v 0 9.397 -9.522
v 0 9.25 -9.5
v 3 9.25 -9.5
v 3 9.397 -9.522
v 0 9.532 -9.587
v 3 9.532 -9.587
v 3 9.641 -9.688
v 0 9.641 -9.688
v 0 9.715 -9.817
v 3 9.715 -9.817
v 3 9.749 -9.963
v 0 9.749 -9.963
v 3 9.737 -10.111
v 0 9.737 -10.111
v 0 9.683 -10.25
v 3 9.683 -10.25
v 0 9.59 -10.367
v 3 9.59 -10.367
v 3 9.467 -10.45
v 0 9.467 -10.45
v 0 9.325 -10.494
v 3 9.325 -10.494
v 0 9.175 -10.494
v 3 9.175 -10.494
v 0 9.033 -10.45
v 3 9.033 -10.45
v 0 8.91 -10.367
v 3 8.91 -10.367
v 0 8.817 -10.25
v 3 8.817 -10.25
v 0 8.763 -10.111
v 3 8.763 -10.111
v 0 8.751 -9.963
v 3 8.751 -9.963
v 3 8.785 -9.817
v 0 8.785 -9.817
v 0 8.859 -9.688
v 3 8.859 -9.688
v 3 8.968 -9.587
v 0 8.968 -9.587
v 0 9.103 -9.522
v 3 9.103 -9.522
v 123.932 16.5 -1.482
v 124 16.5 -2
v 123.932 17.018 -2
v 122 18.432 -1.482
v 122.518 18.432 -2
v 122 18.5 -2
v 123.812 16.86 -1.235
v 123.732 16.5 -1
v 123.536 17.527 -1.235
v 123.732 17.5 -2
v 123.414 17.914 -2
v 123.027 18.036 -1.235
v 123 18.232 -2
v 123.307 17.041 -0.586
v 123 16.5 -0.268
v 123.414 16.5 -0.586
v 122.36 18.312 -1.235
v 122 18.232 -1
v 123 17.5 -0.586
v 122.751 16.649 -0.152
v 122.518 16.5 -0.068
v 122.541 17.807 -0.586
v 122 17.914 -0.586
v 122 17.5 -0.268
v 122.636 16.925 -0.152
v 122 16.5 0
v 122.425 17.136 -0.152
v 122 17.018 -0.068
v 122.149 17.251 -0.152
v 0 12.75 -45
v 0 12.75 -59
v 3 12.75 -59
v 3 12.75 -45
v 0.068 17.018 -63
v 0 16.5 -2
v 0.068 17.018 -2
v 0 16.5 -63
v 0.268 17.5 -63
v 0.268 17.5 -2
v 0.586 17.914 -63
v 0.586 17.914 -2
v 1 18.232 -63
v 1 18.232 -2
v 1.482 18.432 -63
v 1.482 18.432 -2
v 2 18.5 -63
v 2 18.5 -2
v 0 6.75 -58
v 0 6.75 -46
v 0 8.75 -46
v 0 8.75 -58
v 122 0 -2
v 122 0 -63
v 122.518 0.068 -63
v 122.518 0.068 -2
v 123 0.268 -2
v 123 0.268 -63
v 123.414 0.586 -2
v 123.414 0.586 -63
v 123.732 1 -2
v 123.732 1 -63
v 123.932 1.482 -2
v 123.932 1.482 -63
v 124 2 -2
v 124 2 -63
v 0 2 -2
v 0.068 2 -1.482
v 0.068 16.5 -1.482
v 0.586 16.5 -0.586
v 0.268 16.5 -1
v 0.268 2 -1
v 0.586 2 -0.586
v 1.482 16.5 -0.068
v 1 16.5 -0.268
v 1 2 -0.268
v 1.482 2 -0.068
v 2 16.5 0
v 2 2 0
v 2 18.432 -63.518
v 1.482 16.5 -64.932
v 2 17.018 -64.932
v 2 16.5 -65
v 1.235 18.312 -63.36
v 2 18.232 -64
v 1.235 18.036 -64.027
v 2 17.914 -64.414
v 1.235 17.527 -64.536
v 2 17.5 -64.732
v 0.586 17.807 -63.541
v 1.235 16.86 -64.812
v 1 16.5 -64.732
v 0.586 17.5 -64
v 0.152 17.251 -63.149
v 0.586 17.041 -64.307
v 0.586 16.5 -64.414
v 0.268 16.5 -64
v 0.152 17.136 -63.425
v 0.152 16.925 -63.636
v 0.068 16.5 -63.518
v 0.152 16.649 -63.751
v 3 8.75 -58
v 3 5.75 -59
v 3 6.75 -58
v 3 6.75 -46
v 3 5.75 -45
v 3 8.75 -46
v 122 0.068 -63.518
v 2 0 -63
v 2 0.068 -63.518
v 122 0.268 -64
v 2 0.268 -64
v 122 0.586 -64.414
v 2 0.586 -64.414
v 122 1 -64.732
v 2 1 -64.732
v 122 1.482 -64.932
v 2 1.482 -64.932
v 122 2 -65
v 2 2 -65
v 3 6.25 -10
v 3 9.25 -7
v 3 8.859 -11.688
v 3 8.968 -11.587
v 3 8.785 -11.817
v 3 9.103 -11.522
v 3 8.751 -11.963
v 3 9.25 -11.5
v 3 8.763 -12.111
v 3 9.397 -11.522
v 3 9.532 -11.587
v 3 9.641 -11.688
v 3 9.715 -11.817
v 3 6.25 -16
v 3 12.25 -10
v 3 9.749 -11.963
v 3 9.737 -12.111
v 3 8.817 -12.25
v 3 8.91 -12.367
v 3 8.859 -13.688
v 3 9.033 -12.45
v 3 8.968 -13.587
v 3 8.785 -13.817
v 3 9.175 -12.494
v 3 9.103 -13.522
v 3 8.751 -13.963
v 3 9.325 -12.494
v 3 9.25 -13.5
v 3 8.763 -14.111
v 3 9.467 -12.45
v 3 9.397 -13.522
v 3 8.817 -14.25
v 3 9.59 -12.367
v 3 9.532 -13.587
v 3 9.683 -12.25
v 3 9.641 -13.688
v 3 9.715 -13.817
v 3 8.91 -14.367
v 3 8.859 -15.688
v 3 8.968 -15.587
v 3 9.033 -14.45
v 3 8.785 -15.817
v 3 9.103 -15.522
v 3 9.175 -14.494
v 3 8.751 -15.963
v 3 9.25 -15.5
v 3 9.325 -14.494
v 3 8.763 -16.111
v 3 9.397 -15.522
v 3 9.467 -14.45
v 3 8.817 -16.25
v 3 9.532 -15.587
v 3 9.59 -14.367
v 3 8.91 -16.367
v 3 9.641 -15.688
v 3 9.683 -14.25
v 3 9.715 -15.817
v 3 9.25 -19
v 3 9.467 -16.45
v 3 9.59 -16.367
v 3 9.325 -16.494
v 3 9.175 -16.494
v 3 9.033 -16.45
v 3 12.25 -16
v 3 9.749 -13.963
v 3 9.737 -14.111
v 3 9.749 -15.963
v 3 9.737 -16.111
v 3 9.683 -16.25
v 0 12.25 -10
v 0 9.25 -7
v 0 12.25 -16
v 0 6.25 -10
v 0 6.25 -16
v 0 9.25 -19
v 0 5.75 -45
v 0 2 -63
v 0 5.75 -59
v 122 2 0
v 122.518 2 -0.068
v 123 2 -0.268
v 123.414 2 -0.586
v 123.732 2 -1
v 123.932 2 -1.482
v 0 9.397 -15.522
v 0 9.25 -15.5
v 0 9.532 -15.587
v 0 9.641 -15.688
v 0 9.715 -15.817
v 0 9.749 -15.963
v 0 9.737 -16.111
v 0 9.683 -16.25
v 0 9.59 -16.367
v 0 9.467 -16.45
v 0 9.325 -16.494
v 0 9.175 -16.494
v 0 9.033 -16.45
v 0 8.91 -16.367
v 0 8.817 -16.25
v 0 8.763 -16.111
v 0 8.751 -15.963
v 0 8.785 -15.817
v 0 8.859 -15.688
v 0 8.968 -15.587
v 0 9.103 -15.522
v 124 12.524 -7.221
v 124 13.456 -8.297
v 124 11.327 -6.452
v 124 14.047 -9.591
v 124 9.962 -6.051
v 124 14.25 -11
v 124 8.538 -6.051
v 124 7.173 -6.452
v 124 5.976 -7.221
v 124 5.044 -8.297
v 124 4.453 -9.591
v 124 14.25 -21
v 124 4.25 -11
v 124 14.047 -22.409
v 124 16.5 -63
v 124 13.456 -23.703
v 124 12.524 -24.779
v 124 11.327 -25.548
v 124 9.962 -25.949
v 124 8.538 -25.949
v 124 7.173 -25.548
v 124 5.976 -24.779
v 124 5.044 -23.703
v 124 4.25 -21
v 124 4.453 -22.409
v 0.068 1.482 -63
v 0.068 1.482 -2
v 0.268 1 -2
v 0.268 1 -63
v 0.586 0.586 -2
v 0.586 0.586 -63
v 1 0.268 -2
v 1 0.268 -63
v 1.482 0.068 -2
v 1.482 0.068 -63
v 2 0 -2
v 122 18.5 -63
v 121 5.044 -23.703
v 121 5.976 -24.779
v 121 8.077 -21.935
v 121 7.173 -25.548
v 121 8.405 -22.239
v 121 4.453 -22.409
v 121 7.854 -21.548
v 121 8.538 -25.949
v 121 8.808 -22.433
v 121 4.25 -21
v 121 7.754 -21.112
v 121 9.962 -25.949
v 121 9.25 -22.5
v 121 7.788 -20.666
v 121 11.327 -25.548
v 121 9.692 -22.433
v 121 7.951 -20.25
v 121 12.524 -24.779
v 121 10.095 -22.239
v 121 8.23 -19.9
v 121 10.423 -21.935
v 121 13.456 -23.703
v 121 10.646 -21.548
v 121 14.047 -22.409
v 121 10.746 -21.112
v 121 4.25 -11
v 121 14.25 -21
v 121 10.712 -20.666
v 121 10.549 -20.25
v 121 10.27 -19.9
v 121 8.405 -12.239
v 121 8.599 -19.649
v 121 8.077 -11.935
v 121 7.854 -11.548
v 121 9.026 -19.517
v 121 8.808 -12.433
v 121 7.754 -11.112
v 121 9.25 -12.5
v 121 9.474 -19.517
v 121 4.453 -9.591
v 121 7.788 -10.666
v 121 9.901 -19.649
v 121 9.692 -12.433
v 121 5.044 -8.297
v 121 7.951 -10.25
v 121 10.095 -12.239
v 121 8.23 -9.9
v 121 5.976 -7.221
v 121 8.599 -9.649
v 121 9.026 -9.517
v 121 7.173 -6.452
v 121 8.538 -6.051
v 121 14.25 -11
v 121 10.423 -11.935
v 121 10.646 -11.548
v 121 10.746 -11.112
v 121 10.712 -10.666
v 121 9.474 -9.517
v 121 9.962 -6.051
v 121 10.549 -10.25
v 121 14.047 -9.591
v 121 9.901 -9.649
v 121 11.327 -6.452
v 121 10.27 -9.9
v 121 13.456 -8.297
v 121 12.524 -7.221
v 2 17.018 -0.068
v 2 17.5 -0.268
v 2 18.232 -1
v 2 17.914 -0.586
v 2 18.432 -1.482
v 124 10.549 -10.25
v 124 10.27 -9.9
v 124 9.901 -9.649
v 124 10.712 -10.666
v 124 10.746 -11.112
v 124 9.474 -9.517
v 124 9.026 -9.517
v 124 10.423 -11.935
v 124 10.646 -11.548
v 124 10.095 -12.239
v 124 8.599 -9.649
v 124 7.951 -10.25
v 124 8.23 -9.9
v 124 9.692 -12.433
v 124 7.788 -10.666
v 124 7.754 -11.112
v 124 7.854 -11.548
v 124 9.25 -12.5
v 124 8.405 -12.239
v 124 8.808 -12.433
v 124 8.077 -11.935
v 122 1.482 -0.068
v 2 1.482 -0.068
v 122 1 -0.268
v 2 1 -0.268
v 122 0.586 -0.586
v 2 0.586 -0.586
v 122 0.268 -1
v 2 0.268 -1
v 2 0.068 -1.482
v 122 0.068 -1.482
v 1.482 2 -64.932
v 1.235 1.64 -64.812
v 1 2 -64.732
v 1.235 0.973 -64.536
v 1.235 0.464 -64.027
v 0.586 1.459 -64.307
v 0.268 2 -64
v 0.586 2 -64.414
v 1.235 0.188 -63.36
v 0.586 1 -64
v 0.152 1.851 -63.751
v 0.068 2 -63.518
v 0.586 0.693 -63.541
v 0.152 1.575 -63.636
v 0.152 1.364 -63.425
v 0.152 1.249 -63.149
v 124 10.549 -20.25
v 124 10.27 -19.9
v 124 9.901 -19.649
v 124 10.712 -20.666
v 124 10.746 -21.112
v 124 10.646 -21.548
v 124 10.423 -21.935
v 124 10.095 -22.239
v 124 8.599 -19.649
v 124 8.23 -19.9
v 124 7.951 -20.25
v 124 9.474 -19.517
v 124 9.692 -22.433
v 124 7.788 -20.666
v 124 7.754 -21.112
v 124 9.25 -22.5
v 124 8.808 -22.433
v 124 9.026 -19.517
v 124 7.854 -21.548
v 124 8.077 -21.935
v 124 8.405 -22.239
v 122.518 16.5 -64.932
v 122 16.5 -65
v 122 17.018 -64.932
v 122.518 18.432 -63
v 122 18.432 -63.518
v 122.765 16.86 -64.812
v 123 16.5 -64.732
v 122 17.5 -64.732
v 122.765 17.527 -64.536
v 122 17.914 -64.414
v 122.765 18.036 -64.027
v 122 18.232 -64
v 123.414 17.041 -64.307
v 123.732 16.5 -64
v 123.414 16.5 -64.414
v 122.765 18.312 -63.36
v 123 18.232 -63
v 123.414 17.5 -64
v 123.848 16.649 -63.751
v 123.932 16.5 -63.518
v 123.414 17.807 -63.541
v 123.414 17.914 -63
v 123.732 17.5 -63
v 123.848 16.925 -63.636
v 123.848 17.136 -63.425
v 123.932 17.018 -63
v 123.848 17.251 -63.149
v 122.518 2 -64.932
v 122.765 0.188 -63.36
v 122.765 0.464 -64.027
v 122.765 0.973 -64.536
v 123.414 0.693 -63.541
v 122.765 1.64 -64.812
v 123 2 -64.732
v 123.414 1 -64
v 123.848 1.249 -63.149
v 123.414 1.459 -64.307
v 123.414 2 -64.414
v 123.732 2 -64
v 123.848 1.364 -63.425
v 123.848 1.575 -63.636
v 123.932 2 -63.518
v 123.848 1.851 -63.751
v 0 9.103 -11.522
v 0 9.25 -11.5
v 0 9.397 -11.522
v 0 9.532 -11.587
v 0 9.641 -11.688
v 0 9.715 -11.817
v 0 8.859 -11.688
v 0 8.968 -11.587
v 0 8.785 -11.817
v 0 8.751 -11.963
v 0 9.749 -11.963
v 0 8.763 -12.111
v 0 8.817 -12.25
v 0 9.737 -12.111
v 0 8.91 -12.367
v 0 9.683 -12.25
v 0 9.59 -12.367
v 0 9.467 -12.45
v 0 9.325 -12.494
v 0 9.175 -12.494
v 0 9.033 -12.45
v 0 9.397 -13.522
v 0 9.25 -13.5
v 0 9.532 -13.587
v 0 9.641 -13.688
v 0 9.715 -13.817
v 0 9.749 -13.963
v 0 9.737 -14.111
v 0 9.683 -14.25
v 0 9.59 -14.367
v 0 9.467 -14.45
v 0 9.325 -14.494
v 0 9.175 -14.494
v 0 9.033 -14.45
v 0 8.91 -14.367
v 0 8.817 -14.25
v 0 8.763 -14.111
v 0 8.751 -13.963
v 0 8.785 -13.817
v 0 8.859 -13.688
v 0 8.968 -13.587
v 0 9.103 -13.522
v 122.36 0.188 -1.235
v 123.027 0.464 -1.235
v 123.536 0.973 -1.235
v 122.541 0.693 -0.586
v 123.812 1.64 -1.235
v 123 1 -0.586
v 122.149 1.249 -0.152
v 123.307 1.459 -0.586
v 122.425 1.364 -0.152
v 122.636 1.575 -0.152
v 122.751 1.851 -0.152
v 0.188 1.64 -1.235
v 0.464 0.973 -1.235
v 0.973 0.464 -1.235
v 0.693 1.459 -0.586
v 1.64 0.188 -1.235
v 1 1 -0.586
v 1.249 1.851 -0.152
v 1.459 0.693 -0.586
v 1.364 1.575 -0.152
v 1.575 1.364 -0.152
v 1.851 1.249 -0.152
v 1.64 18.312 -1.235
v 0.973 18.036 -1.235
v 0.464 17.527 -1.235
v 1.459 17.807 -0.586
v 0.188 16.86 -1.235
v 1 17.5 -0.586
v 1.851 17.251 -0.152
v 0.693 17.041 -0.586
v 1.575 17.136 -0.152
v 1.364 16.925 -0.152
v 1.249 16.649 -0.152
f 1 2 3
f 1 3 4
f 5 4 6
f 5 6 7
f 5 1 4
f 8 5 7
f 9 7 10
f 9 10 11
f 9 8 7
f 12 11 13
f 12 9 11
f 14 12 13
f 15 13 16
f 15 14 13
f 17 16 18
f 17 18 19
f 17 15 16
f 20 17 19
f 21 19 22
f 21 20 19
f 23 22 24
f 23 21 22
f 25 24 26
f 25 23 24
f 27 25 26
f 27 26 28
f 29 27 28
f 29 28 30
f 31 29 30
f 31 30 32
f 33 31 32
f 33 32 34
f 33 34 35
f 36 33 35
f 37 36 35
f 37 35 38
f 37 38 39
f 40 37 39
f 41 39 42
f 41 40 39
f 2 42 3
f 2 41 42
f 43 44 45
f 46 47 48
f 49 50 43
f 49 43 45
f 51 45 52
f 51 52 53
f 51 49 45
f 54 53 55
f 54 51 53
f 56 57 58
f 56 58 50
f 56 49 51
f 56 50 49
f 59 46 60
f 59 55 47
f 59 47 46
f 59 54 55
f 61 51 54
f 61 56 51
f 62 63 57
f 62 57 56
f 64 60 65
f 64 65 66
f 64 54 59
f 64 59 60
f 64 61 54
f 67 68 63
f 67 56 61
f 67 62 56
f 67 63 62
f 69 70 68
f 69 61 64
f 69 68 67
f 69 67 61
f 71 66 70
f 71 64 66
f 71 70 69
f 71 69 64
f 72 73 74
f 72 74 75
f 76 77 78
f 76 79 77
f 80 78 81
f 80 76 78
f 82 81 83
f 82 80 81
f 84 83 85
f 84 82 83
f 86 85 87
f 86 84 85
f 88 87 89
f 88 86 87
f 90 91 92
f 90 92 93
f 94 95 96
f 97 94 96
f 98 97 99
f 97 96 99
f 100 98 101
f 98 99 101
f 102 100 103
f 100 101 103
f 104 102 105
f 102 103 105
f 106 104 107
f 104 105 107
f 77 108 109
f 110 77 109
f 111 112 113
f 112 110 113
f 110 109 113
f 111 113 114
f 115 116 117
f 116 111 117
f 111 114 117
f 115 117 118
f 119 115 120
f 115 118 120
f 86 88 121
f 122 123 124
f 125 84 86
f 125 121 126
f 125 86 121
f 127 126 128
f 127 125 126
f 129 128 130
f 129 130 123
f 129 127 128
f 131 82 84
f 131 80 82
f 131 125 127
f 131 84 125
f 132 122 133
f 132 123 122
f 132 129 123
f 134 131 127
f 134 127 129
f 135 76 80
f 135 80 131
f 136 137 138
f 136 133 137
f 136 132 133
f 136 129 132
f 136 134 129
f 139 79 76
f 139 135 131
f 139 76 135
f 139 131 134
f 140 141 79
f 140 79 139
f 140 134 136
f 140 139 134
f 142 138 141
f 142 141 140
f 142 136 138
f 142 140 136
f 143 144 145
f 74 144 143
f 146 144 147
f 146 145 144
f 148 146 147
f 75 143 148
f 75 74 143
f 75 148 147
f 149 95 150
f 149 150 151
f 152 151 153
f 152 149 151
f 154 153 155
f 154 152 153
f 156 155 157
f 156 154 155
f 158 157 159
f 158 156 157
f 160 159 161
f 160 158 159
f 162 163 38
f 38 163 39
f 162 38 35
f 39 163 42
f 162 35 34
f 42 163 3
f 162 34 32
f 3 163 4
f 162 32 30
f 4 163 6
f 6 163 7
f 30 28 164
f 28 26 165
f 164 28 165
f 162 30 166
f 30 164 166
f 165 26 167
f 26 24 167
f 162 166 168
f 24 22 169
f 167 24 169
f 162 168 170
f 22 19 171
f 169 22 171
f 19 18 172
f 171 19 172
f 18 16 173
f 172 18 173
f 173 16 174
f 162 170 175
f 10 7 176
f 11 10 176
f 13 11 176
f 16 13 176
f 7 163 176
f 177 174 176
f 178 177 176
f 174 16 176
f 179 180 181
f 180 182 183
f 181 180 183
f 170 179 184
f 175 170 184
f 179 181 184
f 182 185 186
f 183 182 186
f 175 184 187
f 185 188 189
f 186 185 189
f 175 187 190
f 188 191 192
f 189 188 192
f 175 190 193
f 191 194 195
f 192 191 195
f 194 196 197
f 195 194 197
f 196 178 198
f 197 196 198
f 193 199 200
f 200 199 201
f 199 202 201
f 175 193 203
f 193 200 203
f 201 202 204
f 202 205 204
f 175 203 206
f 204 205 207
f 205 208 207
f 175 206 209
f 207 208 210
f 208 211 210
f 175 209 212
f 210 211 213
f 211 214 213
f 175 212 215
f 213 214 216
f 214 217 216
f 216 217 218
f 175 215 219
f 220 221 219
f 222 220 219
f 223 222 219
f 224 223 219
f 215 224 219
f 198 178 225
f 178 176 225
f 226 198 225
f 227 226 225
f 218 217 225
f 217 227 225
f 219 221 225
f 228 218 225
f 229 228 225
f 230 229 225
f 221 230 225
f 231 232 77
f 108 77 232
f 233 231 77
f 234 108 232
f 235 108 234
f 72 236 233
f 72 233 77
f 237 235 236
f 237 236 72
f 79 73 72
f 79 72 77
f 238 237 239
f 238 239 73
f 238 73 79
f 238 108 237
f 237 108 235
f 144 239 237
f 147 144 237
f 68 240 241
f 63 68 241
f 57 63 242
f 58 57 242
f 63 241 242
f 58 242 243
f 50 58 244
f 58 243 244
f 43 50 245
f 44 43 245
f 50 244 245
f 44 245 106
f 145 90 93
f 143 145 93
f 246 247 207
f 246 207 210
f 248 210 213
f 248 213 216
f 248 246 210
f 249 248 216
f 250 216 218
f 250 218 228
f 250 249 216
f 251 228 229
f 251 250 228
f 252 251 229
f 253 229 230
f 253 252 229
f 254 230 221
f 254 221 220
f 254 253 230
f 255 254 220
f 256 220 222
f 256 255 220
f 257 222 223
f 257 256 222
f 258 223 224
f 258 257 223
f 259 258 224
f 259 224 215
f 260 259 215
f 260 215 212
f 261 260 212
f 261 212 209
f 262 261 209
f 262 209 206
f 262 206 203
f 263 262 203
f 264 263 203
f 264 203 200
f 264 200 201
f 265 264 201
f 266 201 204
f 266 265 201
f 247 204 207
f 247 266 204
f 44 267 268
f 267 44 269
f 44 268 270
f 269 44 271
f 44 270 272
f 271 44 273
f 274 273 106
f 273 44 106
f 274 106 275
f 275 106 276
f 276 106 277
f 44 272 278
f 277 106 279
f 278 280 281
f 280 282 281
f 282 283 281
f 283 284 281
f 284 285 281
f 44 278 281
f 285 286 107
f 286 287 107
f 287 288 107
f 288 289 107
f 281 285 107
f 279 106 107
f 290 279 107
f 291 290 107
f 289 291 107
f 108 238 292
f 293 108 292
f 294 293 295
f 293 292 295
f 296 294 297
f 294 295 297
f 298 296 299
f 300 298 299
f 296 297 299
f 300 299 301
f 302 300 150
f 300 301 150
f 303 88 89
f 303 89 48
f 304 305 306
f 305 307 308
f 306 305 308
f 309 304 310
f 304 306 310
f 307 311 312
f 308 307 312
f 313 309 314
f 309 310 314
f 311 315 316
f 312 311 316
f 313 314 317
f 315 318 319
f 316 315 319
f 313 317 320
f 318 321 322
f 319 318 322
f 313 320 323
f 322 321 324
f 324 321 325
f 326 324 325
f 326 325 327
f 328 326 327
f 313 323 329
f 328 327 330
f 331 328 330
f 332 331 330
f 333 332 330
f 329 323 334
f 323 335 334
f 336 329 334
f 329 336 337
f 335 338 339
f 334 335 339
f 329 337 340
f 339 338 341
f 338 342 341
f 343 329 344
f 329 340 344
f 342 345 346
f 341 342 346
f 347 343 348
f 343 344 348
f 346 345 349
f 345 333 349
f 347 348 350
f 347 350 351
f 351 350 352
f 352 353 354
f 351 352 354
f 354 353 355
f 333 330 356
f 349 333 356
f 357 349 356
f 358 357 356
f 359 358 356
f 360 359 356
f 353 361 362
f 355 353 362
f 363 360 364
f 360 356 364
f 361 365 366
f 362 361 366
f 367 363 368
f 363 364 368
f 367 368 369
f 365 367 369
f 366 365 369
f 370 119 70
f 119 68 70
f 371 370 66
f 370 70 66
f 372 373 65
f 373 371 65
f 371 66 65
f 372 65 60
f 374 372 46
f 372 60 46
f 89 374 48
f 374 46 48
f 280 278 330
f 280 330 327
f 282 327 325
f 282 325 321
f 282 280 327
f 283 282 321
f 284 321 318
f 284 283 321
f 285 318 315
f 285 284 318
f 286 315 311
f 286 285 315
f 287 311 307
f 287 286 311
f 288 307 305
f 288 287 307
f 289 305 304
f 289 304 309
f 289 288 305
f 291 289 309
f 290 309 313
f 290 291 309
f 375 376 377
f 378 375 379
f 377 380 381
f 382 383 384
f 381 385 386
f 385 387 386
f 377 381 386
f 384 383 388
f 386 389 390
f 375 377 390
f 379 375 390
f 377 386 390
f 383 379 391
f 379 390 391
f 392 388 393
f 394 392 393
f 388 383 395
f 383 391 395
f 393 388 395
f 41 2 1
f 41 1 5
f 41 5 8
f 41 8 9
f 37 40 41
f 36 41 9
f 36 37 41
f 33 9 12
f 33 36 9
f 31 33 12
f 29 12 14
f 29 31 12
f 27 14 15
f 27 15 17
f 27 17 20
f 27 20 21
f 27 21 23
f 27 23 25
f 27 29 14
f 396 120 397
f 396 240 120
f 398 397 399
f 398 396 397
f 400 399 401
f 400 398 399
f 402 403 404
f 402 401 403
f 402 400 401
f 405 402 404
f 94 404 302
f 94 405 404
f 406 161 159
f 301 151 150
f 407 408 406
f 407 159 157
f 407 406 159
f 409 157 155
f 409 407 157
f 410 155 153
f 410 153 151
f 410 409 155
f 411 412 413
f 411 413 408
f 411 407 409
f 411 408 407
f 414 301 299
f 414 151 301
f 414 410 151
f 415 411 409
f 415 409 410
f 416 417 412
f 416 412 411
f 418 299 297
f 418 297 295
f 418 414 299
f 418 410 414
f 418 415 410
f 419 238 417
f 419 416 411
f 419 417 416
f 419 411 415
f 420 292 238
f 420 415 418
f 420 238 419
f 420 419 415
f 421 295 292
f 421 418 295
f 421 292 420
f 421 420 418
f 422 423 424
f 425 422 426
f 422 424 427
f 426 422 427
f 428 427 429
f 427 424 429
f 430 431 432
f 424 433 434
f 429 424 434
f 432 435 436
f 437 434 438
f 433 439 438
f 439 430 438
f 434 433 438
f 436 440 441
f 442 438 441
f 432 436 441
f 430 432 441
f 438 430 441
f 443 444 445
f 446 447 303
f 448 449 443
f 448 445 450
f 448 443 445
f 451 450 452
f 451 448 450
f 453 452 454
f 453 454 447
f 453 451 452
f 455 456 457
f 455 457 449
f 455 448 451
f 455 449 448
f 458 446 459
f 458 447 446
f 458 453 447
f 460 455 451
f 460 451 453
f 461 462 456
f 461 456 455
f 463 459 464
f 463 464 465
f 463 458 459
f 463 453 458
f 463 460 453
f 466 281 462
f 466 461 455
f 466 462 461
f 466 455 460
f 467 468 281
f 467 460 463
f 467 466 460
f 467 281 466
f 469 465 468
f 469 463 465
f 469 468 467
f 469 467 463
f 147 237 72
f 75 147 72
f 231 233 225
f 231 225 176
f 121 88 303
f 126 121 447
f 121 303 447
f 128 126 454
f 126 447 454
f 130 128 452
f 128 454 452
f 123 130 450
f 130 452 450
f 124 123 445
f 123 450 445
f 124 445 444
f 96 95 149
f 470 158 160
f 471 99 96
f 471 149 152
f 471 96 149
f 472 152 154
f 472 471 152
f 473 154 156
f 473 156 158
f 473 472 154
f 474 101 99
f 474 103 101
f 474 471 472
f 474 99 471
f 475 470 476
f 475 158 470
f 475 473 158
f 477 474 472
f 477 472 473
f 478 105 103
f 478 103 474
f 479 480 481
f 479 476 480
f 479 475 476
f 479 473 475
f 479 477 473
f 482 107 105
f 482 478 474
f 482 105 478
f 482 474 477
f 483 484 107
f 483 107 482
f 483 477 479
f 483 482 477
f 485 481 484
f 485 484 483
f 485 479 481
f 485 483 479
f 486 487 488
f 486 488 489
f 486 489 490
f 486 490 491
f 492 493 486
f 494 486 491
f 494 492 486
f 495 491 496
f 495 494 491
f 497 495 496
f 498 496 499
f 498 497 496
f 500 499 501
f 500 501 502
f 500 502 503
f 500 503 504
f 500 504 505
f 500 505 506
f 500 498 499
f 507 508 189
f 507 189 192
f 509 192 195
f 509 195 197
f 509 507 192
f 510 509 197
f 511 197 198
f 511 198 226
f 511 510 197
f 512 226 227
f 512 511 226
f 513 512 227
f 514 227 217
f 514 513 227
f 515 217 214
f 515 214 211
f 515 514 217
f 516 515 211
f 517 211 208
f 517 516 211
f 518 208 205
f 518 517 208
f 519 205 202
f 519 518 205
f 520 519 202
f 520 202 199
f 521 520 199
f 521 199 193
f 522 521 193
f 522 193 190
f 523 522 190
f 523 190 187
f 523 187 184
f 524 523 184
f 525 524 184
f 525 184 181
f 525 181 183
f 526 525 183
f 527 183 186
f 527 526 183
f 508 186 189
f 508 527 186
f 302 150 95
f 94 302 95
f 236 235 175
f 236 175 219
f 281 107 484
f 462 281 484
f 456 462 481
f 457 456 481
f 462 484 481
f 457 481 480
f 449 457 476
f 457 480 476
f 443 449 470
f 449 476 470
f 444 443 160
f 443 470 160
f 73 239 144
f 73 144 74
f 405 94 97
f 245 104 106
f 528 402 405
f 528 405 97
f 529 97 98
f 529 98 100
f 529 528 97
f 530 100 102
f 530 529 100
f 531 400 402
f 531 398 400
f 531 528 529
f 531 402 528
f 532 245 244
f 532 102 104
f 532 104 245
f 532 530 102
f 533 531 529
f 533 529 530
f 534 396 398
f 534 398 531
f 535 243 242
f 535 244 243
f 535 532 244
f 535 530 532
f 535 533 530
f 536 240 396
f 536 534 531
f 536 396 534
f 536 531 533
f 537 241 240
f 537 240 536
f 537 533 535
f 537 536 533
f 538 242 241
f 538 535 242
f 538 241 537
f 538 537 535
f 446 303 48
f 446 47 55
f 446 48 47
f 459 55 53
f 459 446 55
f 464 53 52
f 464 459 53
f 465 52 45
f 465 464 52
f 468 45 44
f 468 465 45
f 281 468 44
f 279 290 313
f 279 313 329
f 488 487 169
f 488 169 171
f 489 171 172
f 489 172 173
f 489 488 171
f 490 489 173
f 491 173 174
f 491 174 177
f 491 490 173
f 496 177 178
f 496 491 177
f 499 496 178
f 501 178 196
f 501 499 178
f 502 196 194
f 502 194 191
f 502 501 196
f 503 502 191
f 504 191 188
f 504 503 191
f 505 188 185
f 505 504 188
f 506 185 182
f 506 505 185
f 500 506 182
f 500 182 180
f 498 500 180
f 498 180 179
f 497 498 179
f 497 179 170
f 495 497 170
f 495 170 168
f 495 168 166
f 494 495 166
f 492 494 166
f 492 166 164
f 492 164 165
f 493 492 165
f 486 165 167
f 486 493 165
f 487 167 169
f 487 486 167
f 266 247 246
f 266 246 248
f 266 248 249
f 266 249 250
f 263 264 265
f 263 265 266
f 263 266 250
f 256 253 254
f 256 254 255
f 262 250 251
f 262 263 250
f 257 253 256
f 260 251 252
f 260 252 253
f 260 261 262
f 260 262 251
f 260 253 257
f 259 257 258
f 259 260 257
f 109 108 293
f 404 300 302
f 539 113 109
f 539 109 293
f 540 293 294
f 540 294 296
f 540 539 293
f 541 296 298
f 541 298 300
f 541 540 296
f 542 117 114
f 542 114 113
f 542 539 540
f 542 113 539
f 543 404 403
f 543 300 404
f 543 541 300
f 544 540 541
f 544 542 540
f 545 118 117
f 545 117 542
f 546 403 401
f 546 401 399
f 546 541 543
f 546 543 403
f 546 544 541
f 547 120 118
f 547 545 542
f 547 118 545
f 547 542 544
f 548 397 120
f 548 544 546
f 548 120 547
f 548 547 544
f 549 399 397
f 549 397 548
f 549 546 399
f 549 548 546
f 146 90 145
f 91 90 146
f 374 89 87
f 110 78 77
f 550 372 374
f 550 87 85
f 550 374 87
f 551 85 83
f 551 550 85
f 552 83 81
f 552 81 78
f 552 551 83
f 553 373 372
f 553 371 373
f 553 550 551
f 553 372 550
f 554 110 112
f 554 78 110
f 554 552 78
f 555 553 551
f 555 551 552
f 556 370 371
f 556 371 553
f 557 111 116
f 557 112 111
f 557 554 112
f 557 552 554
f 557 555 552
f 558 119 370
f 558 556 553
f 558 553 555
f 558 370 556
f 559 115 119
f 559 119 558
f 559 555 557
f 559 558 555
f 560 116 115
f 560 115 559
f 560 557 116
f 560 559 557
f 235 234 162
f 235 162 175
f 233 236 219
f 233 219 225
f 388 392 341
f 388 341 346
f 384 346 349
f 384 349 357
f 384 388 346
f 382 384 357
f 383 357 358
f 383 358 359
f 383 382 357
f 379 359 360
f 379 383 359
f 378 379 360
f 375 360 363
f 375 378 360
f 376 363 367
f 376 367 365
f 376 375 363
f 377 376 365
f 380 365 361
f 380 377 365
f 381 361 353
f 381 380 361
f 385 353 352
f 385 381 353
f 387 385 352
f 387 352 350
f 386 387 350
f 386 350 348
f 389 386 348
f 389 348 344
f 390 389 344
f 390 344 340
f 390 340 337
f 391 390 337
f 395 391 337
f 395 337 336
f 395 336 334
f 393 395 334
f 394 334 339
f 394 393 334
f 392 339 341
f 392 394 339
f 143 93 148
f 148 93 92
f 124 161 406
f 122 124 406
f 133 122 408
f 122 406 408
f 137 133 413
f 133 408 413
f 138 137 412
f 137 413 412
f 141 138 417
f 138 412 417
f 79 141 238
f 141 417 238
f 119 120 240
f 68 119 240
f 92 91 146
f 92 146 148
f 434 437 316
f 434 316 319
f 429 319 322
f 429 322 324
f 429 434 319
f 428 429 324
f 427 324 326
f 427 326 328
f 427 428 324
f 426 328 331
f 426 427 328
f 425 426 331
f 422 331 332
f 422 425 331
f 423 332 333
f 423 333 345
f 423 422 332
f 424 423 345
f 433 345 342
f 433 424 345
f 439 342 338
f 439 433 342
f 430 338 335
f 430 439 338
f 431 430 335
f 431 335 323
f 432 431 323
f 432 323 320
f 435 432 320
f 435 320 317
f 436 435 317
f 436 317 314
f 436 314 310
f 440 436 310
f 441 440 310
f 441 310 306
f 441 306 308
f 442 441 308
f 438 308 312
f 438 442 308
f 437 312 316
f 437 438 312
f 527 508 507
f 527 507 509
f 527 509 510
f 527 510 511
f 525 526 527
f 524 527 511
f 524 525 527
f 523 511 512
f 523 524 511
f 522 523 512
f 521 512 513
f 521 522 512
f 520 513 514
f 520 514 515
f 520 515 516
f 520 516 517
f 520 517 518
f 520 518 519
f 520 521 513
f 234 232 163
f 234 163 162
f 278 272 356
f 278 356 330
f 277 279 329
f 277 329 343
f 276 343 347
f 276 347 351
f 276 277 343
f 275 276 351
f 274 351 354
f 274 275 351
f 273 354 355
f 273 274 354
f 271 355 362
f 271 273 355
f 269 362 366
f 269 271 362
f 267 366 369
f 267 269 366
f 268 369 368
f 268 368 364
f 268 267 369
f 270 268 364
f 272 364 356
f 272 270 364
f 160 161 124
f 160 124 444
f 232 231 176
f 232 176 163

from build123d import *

# Parameters (mm, degrees)
SKETCH_1_W          = 124
SKETCH_1_H          = 65
EXTRUDE_1_DEPTH     = 18.5
SKETCH_2_R          = 1.5
CUT_EXTRUDE_1_DEPTH = 3
SKETCH_3_W          = 14
SKETCH_3_H          = 7
SKETCH_3_W_2        = 12
SKETCH_3_H_2        = 2
CUT_EXTRUDE_2_DEPTH = 3
SKETCH_4_R          = 0.5
CUT_EXTRUDE_3_DEPTH = 3
FILLET_1_R          = 2
FILLET_2_R          = 2
FILLET_3_R          = 2
FILLET_4_R          = 2


with BuildPart() as part:
    # Эскиз1 → Бобышка-Вытянуть1 (new body)
    with BuildSketch(Plane(origin=(0, 0, 0), x_dir=(1, 0, 0), z_dir=(0, 1, 0))):
        with Locations((62, 32.5)):
            Rectangle(SKETCH_1_W, SKETCH_1_H)
    extrude(amount=EXTRUDE_1_DEPTH)

    # Эскиз2 → Вырез-Вытянуть1 (cut)
    with BuildSketch(Plane(origin=(124, 0, 0), x_dir=(0, 0, -1), z_dir=(1, 0, 0))):
        with BuildLine():
            Line((11, 14.25), (21, 14.25))
            ThreePointArc((21, 14.25), (26, 9.25), (21, 4.25))
            Line((21, 4.25), (11, 4.25))
            ThreePointArc((11, 4.25), (6, 9.25), (11, 14.25))
        make_face()
        with Locations((11, 9.25)):
            Circle(SKETCH_2_R, mode=Mode.SUBTRACT)
        with Locations((21, 9.25)):
            Circle(SKETCH_2_R, mode=Mode.SUBTRACT)
    extrude(amount=-CUT_EXTRUDE_1_DEPTH, mode=Mode.SUBTRACT)

    # Эскиз3 → Вырез-Вытянуть2 (cut)
    with BuildSketch(Plane.ZY):
        with Locations((-52, 9.25)):
            Rectangle(SKETCH_3_W, SKETCH_3_H)
        with Locations((-52, 7.75)):
            Rectangle(SKETCH_3_W_2, SKETCH_3_H_2, mode=Mode.SUBTRACT)
    extrude(amount=-CUT_EXTRUDE_2_DEPTH, mode=Mode.SUBTRACT)

    # Эскиз4 → Вырез-Вытянуть3 (cut)
    with BuildSketch(Plane.ZY):
        Polygon((-19, 9.25), (-16, 12.25), (-10, 12.25), (-7, 9.25), (-10, 6.25), (-16, 6.25), align=None)
        with Locations((-16, 9.25)):
            Circle(SKETCH_4_R, mode=Mode.SUBTRACT)
        with Locations((-14, 9.25)):
            Circle(SKETCH_4_R, mode=Mode.SUBTRACT)
        with Locations((-12, 9.25)):
            Circle(SKETCH_4_R, mode=Mode.SUBTRACT)
        with Locations((-10, 9.25)):
            Circle(SKETCH_4_R, mode=Mode.SUBTRACT)
    extrude(amount=-CUT_EXTRUDE_3_DEPTH, mode=Mode.SUBTRACT)

    # Скругление1
    fillet_1_edges = [part.edges().sort_by_distance(p)[0] for p in [
        (124, 18.5, -32.5),
        (62, 18.5, -65),
        (0, 18.5, -32.5),
        (62, 18.5, 0),
    ]]
    fillet(fillet_1_edges, radius=FILLET_1_R)

    # Скругление2
    fillet_2_edges = [part.edges().sort_by_distance(p)[0] for p in [
        (62, 0, -65),
        (124, 0, -32.5),
        (62, 0, 0),
        (0, 0, -32.5),
    ]]
    fillet(fillet_2_edges, radius=FILLET_2_R)

    # Скругление3
    # the kernel refuses this fillet: 2 mm, written as the material it takes off along each edge
    with BuildSketch(Plane(origin=(2, 16.5, -2), x_dir=(-1, 0, 0), z_dir=(0, 0, 1))) as fillet_3_piece_1_section:
        Polygon((0, 0), (FILLET_3_R, 0), (FILLET_3_R, -FILLET_3_R), (0, -FILLET_3_R), align=None)
    fillet_3_piece_1 = extrude(amount=FILLET_3_R, mode=Mode.PRIVATE)
    fillet_3_piece_1 = fillet_3_piece_1 - Plane(origin=(2, 16.5, -2), x_dir=(0.7071067811865475, -0.7071067811865475, 0), z_dir=(0, 0, 1)) * Sphere(FILLET_3_R, mode=Mode.PRIVATE)
    add(fillet_3_piece_1, mode=Mode.SUBTRACT)
    with BuildSketch(Plane(origin=(122, 16.5, -2), x_dir=(1, 0, 0), z_dir=(0, 0, 1))) as fillet_3_piece_2_section:
        Polygon((0, 0), (FILLET_3_R, 0), (FILLET_3_R, FILLET_3_R), (0, FILLET_3_R), align=None)
    fillet_3_piece_2 = extrude(amount=FILLET_3_R, mode=Mode.PRIVATE)
    fillet_3_piece_2 = fillet_3_piece_2 - Plane(origin=(122, 16.5, -2), x_dir=(-0.7071067811865475, -0.7071067811865475, 0), z_dir=(0, 0, 1)) * Sphere(FILLET_3_R, mode=Mode.PRIVATE)
    add(fillet_3_piece_2, mode=Mode.SUBTRACT)
    with BuildSketch(Plane(origin=(2, 2, -2), x_dir=(-1, 0, 0), z_dir=(0, 0, 1))) as fillet_3_piece_3_section:
        Polygon((0, 0), (FILLET_3_R, 0), (FILLET_3_R, FILLET_3_R), (0, FILLET_3_R), align=None)
    fillet_3_piece_3 = extrude(amount=FILLET_3_R, mode=Mode.PRIVATE)
    fillet_3_piece_3 = fillet_3_piece_3 - Plane(origin=(2, 2, -2), x_dir=(0.7071067811865475, 0.7071067811865475, 0), z_dir=(0, 0, 1)) * Sphere(FILLET_3_R, mode=Mode.PRIVATE)
    add(fillet_3_piece_3, mode=Mode.SUBTRACT)
    with BuildSketch(Plane(origin=(122, 2, -2), x_dir=(1, 0, 0), z_dir=(0, 0, 1))) as fillet_3_piece_4_section:
        Polygon((0, 0), (FILLET_3_R, 0), (FILLET_3_R, -FILLET_3_R), (0, -FILLET_3_R), align=None)
    fillet_3_piece_4 = extrude(amount=FILLET_3_R, mode=Mode.PRIVATE)
    fillet_3_piece_4 = fillet_3_piece_4 - Plane(origin=(122, 2, -2), x_dir=(-0.7071067811865475, 0.7071067811865475, 0), z_dir=(0, 0, 1)) * Sphere(FILLET_3_R, mode=Mode.PRIVATE)
    add(fillet_3_piece_4, mode=Mode.SUBTRACT)
    with BuildSketch(Plane(origin=(124, 2, 0), x_dir=(-1, 0, 0), z_dir=(0, 1, 0))) as fillet_3_piece_5:
        with BuildLine():
            CenterArc((FILLET_3_R, -FILLET_3_R), FILLET_3_R, 90, 90)
            Line((0, -FILLET_3_R), (0, 0))
            Line((0, 0), (FILLET_3_R, 0))
        make_face()
    extrude(amount=14.5, mode=Mode.SUBTRACT)
    with BuildSketch(Plane(origin=(0, 2, 0), x_dir=(1, 0, 0), z_dir=(0, 1, 0))) as fillet_3_piece_6:
        with BuildLine():
            CenterArc((FILLET_3_R, FILLET_3_R), FILLET_3_R, 180, 90)
            Line((0, FILLET_3_R), (0, 0))
            Line((0, 0), (FILLET_3_R, 0))
        make_face()
    extrude(amount=14.5, mode=Mode.SUBTRACT)

    # Скругление4
    # the kernel refuses this fillet: 2 mm, written as the material it takes off along each edge
    with BuildSketch(Plane(origin=(2, 16.5, -63), x_dir=(0, 0, -1), z_dir=(-1, 0, 0))) as fillet_4_piece_1_section:
        Polygon((0, 0), (FILLET_4_R, 0), (FILLET_4_R, -FILLET_4_R), (0, -FILLET_4_R), align=None)
    fillet_4_piece_1 = extrude(amount=FILLET_4_R, mode=Mode.PRIVATE)
    fillet_4_piece_1 = fillet_4_piece_1 - Plane(origin=(2, 16.5, -63), x_dir=(0, -0.7071067811865475, 0.7071067811865475), z_dir=(-1, 0, 0)) * Sphere(FILLET_4_R, mode=Mode.PRIVATE)
    add(fillet_4_piece_1, mode=Mode.SUBTRACT)
    with BuildSketch(Plane(origin=(122, 16.5, -63), x_dir=(0, 0, -1), z_dir=(1, 0, 0))) as fillet_4_piece_2_section:
        Polygon((0, 0), (FILLET_4_R, 0), (FILLET_4_R, FILLET_4_R), (0, FILLET_4_R), align=None)
    fillet_4_piece_2 = extrude(amount=FILLET_4_R, mode=Mode.PRIVATE)
    fillet_4_piece_2 = fillet_4_piece_2 - Plane(origin=(122, 16.5, -63), x_dir=(0, -0.7071067811865475, 0.7071067811865475), z_dir=(1, 0, 0)) * Sphere(FILLET_4_R, mode=Mode.PRIVATE)
    add(fillet_4_piece_2, mode=Mode.SUBTRACT)
    with BuildSketch(Plane(origin=(2, 2, -63), x_dir=(0, 0, -1), z_dir=(-1, 0, 0))) as fillet_4_piece_3_section:
        Polygon((0, 0), (FILLET_4_R, 0), (FILLET_4_R, FILLET_4_R), (0, FILLET_4_R), align=None)
    fillet_4_piece_3 = extrude(amount=FILLET_4_R, mode=Mode.PRIVATE)
    fillet_4_piece_3 = fillet_4_piece_3 - Plane(origin=(2, 2, -63), x_dir=(0, 0.7071067811865475, 0.7071067811865475), z_dir=(-1, 0, 0)) * Sphere(FILLET_4_R, mode=Mode.PRIVATE)
    add(fillet_4_piece_3, mode=Mode.SUBTRACT)
    with BuildSketch(Plane(origin=(122, 2, -63), x_dir=(0, 0, -1), z_dir=(1, 0, 0))) as fillet_4_piece_4_section:
        Polygon((0, 0), (FILLET_4_R, 0), (FILLET_4_R, -FILLET_4_R), (0, -FILLET_4_R), align=None)
    fillet_4_piece_4 = extrude(amount=FILLET_4_R, mode=Mode.PRIVATE)
    fillet_4_piece_4 = fillet_4_piece_4 - Plane(origin=(122, 2, -63), x_dir=(0, 0.7071067811865475, 0.7071067811865475), z_dir=(1, 0, 0)) * Sphere(FILLET_4_R, mode=Mode.PRIVATE)
    add(fillet_4_piece_4, mode=Mode.SUBTRACT)
    with BuildSketch(Plane(origin=(124, 2, -65), x_dir=(0, 0, 1), z_dir=(0, 1, 0))) as fillet_4_piece_5:
        with BuildLine():
            CenterArc((FILLET_4_R, -FILLET_4_R), FILLET_4_R, 90, 90)
            Line((0, -FILLET_4_R), (0, 0))
            Line((0, 0), (FILLET_4_R, 0))
        make_face()
    extrude(amount=14.5, mode=Mode.SUBTRACT)
    with BuildSketch(Plane(origin=(0, 2, -65), x_dir=(0, 0, 1), z_dir=(0, 1, 0))) as fillet_4_piece_6:
        with BuildLine():
            CenterArc((FILLET_4_R, FILLET_4_R), FILLET_4_R, 180, 90)
            Line((0, FILLET_4_R), (0, 0))
            Line((0, 0), (FILLET_4_R, 0))
        make_face()
    extrude(amount=14.5, mode=Mode.SUBTRACT)


solid = part.part
